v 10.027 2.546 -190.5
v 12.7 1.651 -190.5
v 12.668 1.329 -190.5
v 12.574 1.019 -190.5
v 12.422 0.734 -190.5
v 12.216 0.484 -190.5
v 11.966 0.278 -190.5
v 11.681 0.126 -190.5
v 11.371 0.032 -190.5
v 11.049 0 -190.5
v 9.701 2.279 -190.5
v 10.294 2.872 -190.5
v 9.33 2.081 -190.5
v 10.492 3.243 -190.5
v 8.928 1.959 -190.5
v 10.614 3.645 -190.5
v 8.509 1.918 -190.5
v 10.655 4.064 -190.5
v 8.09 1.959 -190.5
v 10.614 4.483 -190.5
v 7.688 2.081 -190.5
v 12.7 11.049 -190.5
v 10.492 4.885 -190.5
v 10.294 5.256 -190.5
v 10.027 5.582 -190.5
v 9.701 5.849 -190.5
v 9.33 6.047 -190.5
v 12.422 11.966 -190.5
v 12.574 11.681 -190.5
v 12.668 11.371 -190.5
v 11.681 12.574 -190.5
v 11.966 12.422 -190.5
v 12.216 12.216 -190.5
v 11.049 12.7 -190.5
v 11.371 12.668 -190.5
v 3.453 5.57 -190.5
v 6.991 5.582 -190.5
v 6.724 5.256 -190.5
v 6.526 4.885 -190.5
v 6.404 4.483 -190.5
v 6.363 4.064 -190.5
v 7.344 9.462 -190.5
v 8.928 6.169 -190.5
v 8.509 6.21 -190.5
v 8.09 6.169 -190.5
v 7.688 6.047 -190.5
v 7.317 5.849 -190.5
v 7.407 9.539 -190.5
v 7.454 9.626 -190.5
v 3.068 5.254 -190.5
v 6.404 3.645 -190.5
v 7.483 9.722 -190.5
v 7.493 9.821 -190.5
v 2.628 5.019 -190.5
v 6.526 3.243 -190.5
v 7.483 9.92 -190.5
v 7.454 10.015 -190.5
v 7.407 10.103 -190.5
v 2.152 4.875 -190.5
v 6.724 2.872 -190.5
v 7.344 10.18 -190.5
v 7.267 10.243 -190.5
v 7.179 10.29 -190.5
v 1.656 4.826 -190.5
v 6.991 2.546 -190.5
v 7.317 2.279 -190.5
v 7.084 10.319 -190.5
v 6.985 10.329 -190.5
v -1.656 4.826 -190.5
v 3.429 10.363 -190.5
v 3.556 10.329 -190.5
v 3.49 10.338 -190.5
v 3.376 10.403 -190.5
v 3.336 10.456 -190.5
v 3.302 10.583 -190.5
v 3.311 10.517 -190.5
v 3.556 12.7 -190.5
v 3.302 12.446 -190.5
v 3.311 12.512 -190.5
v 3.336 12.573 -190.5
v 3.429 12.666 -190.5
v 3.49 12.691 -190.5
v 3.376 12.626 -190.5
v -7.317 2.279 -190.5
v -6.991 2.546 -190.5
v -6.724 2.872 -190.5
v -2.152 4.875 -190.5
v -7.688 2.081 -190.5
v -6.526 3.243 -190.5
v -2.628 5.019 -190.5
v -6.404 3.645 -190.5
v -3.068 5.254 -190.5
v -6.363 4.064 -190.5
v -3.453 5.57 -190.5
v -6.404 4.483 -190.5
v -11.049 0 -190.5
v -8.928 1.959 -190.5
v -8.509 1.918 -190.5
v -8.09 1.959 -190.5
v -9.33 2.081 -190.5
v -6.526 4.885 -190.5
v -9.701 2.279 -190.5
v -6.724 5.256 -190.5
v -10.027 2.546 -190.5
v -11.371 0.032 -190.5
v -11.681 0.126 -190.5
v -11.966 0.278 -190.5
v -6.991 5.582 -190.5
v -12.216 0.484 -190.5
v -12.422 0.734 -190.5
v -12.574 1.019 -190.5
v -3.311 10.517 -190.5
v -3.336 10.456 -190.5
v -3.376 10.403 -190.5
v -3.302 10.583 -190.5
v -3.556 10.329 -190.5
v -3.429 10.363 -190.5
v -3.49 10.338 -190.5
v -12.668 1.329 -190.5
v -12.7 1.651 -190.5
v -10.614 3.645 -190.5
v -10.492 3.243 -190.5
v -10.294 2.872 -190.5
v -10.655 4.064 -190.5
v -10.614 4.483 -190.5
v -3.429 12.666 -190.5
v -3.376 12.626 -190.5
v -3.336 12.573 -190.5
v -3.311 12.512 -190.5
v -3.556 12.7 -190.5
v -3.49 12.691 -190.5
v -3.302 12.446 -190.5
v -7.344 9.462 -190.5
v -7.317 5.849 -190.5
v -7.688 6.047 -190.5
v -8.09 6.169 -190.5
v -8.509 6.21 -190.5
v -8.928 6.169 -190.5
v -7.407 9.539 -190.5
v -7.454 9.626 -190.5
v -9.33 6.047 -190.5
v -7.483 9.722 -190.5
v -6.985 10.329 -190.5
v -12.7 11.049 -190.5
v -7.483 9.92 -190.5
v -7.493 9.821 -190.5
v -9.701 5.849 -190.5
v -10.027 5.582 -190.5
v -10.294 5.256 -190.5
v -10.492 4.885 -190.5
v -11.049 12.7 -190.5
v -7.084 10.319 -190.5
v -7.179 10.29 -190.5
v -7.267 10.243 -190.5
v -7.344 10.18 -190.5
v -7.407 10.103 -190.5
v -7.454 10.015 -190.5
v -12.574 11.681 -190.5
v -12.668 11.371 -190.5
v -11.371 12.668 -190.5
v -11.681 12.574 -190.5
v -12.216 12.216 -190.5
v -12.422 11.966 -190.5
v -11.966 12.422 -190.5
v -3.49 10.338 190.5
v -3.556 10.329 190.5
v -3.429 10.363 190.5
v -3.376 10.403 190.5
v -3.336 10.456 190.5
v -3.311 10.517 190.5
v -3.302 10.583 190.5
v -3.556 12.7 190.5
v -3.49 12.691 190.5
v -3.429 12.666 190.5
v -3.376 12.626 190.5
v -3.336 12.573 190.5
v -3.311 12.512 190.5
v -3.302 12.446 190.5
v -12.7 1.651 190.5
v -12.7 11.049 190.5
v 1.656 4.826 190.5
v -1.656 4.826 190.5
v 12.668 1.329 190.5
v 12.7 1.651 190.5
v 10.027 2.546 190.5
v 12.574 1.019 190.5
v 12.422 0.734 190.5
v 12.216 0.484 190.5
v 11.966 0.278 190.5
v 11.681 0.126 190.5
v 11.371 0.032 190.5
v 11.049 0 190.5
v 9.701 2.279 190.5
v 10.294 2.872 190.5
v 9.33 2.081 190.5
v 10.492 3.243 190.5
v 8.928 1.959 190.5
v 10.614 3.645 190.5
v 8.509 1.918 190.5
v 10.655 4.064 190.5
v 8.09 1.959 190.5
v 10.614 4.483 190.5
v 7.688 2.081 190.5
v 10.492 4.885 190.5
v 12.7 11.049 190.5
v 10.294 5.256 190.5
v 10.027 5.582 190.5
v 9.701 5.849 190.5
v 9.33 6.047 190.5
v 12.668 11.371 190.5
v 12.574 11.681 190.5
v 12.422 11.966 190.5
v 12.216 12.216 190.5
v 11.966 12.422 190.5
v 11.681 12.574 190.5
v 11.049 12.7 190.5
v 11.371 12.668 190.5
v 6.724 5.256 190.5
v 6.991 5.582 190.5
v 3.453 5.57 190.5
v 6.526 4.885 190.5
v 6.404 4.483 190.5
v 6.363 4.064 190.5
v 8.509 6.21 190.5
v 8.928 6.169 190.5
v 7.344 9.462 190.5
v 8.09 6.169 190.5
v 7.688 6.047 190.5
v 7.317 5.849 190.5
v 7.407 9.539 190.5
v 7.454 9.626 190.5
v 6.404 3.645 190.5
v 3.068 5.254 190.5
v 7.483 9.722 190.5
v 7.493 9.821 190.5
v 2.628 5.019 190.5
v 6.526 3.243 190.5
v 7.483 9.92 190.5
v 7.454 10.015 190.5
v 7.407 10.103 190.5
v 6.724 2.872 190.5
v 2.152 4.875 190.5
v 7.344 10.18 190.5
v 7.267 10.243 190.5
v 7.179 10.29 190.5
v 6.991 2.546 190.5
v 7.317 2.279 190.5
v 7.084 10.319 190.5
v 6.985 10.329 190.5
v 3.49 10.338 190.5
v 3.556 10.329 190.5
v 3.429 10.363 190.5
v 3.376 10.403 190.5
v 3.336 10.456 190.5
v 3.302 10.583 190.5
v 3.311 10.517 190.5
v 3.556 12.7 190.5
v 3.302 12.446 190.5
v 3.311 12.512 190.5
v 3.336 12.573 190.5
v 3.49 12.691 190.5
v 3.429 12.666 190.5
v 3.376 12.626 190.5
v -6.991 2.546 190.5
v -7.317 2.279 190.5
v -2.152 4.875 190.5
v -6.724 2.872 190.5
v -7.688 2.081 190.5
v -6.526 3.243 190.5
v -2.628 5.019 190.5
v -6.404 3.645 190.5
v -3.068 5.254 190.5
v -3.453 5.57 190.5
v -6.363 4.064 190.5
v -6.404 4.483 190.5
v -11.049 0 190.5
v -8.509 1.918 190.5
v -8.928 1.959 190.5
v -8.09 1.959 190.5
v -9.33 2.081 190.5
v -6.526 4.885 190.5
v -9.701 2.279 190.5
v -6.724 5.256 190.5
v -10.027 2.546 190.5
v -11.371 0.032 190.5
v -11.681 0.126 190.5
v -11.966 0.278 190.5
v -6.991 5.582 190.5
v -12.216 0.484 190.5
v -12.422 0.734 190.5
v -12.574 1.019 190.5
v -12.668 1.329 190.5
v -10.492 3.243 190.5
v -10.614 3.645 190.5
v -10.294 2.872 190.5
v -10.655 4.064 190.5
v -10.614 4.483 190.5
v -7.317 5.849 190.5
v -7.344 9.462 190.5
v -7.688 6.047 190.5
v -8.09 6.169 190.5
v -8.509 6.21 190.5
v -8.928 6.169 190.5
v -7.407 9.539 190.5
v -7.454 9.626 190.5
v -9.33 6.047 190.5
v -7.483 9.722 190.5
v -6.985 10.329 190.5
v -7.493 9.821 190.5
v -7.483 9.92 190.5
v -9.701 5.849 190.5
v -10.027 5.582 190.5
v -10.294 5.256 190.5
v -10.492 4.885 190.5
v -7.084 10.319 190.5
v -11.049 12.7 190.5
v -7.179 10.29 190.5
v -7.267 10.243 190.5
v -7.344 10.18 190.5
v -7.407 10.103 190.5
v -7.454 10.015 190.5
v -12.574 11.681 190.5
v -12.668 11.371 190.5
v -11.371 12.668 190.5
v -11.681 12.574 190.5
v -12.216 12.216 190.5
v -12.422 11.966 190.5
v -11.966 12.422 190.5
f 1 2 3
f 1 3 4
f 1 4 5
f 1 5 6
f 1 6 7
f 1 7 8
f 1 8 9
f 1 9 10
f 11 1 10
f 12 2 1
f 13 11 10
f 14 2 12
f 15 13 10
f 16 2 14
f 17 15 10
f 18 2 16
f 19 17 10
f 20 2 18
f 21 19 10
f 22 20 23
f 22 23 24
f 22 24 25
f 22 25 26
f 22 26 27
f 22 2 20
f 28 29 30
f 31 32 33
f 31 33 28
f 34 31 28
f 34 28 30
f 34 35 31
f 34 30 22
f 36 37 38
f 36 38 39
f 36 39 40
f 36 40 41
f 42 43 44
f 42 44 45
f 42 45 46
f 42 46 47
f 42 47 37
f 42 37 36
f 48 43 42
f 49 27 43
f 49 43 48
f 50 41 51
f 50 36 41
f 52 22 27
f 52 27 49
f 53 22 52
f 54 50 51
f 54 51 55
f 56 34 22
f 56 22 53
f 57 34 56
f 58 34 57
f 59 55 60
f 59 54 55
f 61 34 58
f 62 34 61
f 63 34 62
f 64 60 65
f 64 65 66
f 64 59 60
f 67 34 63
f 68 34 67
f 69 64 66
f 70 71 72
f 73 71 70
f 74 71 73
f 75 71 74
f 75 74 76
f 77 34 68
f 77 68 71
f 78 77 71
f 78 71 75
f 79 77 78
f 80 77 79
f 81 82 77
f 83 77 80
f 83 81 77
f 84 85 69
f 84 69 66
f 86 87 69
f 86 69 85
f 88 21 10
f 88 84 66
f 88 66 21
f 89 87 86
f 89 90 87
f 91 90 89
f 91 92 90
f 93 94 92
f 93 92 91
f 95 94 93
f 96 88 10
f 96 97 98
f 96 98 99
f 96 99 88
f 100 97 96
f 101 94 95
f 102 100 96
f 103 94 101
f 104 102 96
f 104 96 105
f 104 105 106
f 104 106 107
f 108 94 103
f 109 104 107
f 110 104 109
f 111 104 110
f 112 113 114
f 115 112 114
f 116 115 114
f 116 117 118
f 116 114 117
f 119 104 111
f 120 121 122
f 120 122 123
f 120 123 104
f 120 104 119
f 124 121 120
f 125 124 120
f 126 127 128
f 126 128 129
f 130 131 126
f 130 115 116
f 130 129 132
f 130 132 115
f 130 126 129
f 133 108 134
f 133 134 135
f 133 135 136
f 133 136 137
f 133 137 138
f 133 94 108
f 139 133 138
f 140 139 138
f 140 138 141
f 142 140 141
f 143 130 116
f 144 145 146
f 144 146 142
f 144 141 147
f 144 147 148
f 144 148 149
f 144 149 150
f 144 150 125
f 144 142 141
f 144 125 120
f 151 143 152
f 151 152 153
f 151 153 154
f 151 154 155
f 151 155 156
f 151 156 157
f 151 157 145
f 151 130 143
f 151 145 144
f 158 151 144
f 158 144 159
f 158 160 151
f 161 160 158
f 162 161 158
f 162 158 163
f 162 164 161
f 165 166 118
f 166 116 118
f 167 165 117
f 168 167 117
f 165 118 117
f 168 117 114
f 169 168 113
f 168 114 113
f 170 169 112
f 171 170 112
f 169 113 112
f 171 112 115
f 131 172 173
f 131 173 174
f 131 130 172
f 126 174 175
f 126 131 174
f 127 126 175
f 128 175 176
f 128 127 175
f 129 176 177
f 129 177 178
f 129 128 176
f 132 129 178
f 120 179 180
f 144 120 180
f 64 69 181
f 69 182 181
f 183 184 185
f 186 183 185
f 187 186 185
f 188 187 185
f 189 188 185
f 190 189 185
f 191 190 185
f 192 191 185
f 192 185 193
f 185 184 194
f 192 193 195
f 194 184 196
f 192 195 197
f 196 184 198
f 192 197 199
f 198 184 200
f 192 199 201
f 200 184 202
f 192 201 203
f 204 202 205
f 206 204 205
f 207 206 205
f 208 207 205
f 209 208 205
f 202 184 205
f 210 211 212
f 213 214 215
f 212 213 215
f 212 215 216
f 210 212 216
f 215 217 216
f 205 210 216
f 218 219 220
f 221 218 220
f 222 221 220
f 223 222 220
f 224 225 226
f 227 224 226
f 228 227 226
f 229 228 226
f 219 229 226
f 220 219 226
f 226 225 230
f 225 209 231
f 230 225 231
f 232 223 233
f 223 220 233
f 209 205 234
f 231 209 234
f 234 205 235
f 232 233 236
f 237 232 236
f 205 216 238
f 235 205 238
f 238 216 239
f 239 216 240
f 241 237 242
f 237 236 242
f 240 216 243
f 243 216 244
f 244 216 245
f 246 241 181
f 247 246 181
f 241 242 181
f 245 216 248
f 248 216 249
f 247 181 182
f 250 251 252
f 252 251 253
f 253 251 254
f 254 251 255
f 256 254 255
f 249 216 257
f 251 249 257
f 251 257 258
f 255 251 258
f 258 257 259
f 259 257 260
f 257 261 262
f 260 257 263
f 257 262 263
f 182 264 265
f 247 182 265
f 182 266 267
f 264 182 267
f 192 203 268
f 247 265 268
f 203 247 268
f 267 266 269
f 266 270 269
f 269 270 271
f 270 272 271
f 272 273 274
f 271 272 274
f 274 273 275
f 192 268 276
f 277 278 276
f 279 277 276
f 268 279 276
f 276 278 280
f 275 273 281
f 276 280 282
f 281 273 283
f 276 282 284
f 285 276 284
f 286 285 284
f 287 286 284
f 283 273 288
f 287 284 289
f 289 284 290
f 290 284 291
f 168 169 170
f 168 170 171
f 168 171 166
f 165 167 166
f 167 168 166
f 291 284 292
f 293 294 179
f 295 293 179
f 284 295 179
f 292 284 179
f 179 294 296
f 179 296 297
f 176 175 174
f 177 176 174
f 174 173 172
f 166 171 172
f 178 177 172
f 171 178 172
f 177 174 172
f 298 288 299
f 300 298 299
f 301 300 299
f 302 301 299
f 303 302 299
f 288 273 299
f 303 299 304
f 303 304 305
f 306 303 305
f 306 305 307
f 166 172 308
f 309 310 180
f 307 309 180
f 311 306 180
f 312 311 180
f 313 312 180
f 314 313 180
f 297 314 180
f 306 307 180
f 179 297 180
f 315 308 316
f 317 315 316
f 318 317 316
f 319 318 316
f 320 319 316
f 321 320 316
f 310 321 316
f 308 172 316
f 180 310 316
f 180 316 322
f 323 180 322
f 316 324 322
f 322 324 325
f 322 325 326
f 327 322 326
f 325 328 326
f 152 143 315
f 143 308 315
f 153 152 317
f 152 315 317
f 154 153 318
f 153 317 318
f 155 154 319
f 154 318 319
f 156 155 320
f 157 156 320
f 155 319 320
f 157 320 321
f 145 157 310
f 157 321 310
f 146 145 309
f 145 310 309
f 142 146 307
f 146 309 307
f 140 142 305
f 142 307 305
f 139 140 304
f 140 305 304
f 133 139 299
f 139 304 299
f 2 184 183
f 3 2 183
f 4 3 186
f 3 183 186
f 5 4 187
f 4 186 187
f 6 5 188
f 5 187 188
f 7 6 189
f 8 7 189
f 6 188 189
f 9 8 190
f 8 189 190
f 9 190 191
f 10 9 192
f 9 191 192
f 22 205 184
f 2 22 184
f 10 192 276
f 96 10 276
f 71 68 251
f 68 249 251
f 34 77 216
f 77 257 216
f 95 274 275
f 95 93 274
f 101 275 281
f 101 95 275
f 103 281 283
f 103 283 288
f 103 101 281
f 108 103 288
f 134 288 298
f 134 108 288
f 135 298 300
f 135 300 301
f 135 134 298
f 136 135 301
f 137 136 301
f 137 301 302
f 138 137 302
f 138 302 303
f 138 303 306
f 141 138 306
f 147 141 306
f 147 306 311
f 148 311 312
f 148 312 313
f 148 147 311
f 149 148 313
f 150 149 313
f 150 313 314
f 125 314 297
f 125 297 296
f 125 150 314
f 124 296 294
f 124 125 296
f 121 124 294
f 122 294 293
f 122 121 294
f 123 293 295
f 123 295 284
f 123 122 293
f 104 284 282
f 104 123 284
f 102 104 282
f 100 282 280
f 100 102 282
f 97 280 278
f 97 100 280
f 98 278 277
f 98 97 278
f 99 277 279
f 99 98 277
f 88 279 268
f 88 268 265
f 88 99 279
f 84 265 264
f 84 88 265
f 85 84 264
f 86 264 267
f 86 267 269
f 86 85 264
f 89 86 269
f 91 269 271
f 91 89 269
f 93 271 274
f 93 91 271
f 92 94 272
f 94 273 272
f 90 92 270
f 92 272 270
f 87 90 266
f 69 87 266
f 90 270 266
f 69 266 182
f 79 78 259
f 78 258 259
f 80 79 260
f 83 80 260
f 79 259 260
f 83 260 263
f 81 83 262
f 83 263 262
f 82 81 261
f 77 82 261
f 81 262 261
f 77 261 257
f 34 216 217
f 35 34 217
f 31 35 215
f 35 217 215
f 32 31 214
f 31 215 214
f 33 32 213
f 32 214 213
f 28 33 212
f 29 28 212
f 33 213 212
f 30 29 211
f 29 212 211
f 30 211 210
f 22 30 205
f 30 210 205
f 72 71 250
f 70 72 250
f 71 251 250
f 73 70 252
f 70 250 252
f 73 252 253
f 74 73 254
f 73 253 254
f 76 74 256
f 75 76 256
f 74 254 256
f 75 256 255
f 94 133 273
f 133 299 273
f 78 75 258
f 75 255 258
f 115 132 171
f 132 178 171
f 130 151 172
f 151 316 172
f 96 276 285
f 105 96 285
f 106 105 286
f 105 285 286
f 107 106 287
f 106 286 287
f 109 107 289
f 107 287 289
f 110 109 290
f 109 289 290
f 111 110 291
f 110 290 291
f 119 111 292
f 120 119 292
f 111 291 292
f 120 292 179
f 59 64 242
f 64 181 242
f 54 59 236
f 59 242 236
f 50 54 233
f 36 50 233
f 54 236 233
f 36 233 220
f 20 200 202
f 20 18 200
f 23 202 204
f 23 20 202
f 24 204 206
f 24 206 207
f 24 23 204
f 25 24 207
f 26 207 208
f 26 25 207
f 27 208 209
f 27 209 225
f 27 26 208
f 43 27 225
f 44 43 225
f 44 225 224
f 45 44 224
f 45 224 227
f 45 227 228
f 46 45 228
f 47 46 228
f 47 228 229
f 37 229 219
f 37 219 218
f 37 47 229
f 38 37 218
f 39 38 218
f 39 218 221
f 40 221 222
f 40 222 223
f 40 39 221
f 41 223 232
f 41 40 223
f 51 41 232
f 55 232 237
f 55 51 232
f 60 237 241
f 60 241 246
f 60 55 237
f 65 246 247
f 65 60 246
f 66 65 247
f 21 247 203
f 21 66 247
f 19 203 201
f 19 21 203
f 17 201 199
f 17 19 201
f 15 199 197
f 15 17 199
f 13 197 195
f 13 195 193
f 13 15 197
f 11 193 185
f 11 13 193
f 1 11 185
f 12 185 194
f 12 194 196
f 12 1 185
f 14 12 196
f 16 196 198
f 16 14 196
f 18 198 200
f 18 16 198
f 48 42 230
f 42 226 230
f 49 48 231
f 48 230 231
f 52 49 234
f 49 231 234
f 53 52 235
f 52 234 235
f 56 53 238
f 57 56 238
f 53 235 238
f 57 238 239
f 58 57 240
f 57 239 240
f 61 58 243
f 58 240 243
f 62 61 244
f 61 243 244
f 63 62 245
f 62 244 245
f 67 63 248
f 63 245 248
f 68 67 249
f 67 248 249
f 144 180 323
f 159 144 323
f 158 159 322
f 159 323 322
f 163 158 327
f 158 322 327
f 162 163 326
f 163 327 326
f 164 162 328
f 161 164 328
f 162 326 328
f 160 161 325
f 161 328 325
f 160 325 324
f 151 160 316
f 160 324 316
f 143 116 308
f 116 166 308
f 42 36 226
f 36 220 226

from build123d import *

# Parameters (mm, degrees)
SKETCH3_R           = 2.1463
BOSS_EXTRUDE1_DEPTH = 190.5
FILLET1_R           = 0.254


with BuildPart() as part:
    # Sketch3 → Boss-Extrude1 (new body, symmetric)
    with BuildSketch(Plane.XY):
        with BuildLine():
            Line((-11.049, 12.7), (-3.302, 12.7))
            Line((-3.302, 12.7), (-3.302, 10.328863887))
            Line((-3.302, 10.328863887), (-6.985, 10.328863887))
            ThreePointArc((-6.985, 10.328863887), (-7.454330803, 10.01526707), (-7.344210245, 9.461653642))
            Line((-7.344210245, 9.461653642), (-3.452505379, 5.569948776))
            ThreePointArc((-3.452505379, 5.569948776), (-2.628470073, 5.019345987), (-1.656454155, 4.826))
            Line((-1.656454155, 4.826), (1.656454155, 4.826))
            ThreePointArc((1.656454155, 4.826), (2.628470073, 5.019345987), (3.452505379, 5.569948776))
            Line((3.452505379, 5.569948776), (7.344210245, 9.461653642))
            ThreePointArc((7.344210245, 9.461653642), (7.454330803, 10.01526707), (6.985, 10.328863887))
            Line((6.985, 10.328863887), (3.302, 10.328863887))
            Line((3.302, 10.328863887), (3.302, 12.7))
            Line((3.302, 12.7), (11.049, 12.7))
            ThreePointArc((11.049, 12.7), (12.216433296, 12.216433296), (12.7, 11.049))
            Line((12.7, 11.049), (12.7, 1.651))
            ThreePointArc((12.7, 1.651), (12.216433296, 0.483566704), (11.049, 0))
            Line((11.049, 0), (-11.049, 0))
            ThreePointArc((-11.049, 0), (-12.216433296, 0.483566704), (-12.7, 1.651))
            Line((-12.7, 1.651), (-12.7, 11.049))
            ThreePointArc((-12.7, 11.049), (-12.216433296, 12.216433296), (-11.049, 12.7))
        make_face()
        with Locations((8.509, 4.064)):
            Circle(SKETCH3_R, mode=Mode.SUBTRACT)
        with Locations((-8.509, 4.064)):
            Circle(SKETCH3_R, mode=Mode.SUBTRACT)
    extrude(amount=BOSS_EXTRUDE1_DEPTH, both=True)

    # Fillet1
    fillet1_edges = [part.edges().sort_by_distance(p)[0] for p in [
        (-3.302, 12.7, 0),
        (-3.302, 10.328863887, 0),
        (3.302, 10.328863887, 0),
        (3.302, 12.7, 0),
    ]]
    fillet(fillet1_edges, radius=FILLET1_R)


solid = part.part
